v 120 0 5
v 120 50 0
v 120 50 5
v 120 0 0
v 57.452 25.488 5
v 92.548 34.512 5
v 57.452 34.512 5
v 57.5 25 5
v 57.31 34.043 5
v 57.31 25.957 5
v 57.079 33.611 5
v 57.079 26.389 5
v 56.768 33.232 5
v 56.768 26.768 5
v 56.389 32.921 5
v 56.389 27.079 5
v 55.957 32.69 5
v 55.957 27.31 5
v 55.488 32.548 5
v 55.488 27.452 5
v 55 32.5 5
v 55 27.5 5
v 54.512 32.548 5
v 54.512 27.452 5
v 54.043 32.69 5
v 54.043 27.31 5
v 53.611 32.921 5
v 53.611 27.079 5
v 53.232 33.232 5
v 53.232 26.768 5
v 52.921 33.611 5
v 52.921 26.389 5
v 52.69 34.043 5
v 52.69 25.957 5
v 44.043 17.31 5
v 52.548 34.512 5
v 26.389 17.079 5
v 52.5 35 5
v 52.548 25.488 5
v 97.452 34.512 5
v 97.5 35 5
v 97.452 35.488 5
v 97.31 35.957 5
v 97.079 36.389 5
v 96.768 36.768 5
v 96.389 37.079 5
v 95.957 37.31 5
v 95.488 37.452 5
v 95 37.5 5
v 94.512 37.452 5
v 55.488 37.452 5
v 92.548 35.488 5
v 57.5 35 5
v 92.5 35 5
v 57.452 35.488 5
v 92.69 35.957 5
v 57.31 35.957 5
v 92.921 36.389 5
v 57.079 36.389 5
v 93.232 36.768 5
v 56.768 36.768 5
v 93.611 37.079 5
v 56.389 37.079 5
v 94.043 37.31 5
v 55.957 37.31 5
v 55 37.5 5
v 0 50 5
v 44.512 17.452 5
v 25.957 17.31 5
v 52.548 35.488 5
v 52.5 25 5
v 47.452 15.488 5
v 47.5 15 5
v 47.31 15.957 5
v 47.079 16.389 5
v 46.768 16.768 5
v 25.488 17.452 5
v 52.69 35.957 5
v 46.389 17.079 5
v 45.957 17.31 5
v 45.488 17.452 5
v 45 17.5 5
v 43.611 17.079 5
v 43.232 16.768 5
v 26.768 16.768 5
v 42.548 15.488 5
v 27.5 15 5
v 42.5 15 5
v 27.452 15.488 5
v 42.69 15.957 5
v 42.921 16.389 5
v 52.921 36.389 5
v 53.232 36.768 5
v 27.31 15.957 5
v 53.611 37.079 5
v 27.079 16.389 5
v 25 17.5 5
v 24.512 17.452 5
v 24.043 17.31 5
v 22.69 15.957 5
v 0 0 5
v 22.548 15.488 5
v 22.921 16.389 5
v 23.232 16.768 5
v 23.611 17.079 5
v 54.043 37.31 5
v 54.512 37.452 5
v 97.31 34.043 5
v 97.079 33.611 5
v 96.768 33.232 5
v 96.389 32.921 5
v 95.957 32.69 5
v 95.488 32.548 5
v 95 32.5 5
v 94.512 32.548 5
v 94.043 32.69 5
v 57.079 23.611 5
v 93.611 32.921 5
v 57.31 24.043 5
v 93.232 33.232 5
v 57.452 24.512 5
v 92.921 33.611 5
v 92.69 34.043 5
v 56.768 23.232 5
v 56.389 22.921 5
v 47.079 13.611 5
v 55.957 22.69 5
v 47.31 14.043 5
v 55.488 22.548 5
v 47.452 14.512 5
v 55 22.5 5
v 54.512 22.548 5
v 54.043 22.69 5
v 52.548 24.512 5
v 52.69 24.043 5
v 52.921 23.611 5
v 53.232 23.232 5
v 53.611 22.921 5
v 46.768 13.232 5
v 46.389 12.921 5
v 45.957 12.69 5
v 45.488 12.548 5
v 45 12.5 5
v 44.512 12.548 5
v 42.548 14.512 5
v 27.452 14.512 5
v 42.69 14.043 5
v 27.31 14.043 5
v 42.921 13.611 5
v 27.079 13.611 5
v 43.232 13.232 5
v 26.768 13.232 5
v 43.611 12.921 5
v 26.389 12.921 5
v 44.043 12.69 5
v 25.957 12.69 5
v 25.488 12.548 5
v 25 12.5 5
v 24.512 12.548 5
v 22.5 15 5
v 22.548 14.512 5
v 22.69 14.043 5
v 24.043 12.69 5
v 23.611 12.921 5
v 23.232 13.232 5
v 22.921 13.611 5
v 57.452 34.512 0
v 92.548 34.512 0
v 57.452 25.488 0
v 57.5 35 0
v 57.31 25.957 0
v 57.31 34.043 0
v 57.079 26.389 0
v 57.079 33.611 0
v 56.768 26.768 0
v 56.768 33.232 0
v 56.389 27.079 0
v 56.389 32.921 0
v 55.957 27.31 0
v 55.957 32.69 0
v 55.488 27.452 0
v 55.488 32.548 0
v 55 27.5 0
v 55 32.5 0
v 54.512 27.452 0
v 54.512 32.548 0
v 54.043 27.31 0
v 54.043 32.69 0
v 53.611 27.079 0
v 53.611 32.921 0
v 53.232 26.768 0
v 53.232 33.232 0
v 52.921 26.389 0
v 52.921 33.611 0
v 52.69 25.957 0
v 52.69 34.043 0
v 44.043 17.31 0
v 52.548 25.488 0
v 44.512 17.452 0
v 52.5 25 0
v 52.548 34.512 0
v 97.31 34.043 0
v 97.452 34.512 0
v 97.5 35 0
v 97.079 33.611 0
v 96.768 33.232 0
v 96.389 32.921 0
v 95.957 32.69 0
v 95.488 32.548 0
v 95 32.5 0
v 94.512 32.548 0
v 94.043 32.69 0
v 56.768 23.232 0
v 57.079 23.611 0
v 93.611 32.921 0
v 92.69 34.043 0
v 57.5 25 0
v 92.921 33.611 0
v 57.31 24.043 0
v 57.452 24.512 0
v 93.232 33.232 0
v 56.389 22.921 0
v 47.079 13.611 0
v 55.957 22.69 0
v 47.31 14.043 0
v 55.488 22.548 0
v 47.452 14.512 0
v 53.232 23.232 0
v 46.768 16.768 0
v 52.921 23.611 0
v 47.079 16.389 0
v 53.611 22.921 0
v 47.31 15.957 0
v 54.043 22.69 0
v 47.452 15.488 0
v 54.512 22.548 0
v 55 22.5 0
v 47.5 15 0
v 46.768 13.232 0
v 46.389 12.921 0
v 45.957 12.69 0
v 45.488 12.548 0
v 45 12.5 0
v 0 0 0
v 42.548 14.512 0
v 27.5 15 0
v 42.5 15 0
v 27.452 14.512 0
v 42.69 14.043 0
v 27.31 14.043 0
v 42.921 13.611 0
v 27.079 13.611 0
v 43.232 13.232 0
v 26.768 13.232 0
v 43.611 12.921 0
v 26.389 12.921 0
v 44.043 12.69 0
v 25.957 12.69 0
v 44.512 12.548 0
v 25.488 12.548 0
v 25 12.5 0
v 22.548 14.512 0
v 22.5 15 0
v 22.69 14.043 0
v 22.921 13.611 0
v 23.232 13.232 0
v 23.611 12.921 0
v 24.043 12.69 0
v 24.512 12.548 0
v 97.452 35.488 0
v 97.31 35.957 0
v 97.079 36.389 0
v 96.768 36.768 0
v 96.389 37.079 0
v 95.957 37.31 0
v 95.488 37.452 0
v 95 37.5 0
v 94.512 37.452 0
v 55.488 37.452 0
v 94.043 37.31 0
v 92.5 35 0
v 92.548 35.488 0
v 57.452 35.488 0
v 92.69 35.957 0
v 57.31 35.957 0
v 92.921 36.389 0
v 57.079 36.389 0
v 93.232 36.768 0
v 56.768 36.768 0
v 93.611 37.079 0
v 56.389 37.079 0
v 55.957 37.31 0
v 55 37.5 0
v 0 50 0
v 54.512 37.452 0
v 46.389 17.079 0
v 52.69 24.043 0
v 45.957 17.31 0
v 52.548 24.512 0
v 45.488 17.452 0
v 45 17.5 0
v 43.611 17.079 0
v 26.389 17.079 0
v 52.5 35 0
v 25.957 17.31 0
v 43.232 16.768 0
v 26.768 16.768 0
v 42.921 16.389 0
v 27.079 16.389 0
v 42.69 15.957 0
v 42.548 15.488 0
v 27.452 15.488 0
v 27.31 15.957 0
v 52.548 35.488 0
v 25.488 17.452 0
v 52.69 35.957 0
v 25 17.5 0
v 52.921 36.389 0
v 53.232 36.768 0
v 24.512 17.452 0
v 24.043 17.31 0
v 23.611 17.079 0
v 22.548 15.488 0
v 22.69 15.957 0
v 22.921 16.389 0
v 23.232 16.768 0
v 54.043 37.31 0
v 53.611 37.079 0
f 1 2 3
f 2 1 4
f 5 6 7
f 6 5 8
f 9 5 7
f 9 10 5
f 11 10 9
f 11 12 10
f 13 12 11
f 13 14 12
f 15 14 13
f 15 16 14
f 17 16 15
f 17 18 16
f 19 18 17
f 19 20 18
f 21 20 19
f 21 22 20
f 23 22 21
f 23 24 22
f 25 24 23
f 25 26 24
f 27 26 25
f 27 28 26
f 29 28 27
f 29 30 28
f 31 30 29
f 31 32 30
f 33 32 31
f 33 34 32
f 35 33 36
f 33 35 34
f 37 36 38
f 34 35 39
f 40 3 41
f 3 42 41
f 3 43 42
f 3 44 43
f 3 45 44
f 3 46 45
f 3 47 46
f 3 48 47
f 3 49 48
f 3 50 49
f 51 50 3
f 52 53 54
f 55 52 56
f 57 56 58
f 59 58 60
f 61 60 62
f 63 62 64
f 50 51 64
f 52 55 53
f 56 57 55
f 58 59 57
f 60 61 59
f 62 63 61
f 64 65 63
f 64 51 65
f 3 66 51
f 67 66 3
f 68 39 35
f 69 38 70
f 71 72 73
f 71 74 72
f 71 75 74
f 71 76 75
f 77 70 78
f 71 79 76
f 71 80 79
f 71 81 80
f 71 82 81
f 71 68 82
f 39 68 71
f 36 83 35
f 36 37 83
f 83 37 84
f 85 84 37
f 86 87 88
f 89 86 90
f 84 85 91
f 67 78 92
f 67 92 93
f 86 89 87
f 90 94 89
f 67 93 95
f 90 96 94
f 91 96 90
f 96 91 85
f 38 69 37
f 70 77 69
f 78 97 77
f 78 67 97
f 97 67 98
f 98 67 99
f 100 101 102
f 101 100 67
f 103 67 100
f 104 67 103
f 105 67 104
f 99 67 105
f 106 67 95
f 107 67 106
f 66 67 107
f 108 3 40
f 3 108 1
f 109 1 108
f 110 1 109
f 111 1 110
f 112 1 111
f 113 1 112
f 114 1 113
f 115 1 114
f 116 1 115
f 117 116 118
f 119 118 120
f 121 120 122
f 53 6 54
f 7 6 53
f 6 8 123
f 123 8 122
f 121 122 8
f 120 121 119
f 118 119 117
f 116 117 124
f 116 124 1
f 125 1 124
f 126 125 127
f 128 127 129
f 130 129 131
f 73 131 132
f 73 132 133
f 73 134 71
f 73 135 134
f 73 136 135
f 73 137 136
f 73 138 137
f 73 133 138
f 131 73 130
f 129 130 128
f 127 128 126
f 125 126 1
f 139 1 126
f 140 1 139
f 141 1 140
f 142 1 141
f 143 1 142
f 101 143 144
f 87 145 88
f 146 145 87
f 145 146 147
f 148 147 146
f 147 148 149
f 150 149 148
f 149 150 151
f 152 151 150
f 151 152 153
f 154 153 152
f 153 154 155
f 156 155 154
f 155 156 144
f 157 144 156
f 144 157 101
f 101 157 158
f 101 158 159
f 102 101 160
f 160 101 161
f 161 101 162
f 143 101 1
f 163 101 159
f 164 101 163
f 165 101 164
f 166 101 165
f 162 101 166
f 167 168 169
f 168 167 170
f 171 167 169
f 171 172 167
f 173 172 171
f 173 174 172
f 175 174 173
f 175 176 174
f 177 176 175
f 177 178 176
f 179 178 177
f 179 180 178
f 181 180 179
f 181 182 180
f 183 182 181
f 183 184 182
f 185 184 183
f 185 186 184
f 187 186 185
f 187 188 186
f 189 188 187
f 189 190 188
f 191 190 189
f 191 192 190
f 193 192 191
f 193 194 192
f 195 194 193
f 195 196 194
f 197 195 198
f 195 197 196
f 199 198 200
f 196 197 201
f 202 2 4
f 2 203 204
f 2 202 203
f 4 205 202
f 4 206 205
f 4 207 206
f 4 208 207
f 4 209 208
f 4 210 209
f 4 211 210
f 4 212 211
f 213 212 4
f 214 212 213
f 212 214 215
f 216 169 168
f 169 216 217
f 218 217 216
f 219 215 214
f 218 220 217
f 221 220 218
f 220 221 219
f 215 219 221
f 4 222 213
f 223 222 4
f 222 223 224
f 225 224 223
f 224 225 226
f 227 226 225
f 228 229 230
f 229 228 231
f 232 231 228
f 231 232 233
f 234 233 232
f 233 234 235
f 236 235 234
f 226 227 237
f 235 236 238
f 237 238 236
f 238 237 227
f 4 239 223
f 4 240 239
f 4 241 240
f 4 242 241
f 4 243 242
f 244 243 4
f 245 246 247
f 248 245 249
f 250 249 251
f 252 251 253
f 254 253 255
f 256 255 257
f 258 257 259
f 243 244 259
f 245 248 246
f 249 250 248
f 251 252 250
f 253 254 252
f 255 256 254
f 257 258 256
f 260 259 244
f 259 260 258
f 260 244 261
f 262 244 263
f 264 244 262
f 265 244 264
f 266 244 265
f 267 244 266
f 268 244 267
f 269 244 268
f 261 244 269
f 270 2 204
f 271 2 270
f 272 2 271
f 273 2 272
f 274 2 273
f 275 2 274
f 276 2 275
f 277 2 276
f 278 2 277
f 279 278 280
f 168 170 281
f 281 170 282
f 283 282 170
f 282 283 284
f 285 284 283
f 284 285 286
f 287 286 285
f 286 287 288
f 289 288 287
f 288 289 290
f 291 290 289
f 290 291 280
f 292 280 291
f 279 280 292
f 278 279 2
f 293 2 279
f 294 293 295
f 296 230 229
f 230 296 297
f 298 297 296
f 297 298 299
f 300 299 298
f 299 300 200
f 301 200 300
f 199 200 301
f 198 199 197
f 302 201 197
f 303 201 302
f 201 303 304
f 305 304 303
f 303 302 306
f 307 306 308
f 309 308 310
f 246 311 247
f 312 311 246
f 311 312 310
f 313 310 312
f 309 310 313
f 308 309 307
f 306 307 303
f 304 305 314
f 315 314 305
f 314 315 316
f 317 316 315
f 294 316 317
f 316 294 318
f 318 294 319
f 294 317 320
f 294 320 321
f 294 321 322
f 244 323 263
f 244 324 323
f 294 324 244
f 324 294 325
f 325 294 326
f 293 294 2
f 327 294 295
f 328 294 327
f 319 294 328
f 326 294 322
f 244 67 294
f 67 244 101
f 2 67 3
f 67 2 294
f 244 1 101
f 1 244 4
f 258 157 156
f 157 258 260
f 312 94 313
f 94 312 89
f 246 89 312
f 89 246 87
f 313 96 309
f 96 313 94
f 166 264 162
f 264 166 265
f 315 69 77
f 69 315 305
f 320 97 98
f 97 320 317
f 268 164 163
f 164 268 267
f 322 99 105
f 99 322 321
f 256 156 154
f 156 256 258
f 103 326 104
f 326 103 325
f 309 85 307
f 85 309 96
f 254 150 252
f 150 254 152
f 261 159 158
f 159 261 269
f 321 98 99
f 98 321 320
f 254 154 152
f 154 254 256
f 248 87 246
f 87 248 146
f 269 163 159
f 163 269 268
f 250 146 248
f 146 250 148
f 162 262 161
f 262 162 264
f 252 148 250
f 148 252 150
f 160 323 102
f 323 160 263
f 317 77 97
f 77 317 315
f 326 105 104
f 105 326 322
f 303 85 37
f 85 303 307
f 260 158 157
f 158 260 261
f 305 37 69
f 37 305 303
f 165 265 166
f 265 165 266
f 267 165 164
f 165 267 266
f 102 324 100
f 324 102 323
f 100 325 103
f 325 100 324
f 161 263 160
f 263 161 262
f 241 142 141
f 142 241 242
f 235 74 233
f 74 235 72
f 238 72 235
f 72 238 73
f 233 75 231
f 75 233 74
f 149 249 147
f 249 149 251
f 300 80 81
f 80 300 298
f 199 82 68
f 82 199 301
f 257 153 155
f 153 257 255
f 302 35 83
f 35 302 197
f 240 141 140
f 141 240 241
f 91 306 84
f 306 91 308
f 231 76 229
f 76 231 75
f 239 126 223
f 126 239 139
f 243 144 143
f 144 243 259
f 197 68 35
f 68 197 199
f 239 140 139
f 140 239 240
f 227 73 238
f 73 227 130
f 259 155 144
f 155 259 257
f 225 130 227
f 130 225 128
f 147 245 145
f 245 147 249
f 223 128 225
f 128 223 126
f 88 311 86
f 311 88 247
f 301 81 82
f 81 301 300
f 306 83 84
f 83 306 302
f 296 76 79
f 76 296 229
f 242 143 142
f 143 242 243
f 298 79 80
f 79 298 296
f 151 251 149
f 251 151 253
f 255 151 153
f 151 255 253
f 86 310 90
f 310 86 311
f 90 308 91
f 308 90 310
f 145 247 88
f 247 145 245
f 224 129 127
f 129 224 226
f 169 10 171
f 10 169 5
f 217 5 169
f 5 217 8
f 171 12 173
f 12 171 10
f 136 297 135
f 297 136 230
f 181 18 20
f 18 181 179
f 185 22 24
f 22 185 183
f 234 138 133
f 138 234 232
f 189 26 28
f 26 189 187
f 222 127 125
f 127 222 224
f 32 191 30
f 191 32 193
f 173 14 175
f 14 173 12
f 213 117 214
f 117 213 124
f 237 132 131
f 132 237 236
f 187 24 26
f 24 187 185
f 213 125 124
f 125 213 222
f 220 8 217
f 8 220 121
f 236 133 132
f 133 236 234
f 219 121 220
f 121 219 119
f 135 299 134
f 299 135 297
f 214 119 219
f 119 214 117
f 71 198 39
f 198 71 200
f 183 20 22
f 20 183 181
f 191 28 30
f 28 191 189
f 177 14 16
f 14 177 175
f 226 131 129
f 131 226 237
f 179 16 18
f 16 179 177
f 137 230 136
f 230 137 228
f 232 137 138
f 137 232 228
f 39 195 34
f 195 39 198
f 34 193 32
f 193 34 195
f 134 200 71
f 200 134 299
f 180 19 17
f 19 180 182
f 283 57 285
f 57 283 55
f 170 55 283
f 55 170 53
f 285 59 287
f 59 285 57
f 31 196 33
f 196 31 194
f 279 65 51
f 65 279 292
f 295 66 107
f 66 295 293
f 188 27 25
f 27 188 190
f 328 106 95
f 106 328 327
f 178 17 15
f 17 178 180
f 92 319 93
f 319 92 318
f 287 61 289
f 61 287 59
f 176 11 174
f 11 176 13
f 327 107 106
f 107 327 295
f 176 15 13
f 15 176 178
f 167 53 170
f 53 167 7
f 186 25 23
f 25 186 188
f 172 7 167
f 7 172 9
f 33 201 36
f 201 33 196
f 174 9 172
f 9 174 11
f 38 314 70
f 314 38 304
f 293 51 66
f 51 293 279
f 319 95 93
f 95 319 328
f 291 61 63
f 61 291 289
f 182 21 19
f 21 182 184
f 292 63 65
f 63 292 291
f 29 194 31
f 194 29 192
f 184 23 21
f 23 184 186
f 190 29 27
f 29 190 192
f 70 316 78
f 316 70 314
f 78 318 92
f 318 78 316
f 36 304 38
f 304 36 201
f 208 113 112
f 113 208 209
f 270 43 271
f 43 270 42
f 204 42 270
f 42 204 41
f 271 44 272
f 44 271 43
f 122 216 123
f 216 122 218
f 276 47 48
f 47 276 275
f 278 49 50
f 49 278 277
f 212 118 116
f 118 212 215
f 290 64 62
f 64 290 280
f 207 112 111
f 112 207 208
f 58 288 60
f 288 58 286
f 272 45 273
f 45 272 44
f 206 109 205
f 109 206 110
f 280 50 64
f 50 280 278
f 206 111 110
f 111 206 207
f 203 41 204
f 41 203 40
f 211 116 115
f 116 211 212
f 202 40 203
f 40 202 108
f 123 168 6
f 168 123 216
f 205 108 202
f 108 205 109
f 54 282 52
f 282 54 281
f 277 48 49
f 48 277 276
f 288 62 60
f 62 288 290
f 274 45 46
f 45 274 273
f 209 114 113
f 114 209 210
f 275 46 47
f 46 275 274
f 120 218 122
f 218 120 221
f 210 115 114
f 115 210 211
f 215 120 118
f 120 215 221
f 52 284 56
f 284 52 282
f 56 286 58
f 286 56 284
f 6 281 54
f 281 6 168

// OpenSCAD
$fn = 32;

// ----------------------------------------------------------------------
// Hole field: plate with holes at given coordinates
// ----------------------------------------------------------------------

// --- parameters (mm) ---
plate_l = 120;            // plate length, X
plate_w = 50;             // plate width, Y
plate_t = 5;              // plate thickness, Z
hole_d = 5;               // hole diameter

difference() {
  cube([plate_l, plate_w, plate_t]);
  translate([25, 15, -1]) cylinder(h = plate_t + 2, d = hole_d);
  translate([45, 15, -1]) cylinder(h = plate_t + 2, d = hole_d);
  translate([55, 25, -1]) cylinder(h = plate_t + 2, d = hole_d);
  translate([55, 35, -1]) cylinder(h = plate_t + 2, d = hole_d);
  translate([95, 35, -1]) cylinder(h = plate_t + 2, d = hole_d);
}
